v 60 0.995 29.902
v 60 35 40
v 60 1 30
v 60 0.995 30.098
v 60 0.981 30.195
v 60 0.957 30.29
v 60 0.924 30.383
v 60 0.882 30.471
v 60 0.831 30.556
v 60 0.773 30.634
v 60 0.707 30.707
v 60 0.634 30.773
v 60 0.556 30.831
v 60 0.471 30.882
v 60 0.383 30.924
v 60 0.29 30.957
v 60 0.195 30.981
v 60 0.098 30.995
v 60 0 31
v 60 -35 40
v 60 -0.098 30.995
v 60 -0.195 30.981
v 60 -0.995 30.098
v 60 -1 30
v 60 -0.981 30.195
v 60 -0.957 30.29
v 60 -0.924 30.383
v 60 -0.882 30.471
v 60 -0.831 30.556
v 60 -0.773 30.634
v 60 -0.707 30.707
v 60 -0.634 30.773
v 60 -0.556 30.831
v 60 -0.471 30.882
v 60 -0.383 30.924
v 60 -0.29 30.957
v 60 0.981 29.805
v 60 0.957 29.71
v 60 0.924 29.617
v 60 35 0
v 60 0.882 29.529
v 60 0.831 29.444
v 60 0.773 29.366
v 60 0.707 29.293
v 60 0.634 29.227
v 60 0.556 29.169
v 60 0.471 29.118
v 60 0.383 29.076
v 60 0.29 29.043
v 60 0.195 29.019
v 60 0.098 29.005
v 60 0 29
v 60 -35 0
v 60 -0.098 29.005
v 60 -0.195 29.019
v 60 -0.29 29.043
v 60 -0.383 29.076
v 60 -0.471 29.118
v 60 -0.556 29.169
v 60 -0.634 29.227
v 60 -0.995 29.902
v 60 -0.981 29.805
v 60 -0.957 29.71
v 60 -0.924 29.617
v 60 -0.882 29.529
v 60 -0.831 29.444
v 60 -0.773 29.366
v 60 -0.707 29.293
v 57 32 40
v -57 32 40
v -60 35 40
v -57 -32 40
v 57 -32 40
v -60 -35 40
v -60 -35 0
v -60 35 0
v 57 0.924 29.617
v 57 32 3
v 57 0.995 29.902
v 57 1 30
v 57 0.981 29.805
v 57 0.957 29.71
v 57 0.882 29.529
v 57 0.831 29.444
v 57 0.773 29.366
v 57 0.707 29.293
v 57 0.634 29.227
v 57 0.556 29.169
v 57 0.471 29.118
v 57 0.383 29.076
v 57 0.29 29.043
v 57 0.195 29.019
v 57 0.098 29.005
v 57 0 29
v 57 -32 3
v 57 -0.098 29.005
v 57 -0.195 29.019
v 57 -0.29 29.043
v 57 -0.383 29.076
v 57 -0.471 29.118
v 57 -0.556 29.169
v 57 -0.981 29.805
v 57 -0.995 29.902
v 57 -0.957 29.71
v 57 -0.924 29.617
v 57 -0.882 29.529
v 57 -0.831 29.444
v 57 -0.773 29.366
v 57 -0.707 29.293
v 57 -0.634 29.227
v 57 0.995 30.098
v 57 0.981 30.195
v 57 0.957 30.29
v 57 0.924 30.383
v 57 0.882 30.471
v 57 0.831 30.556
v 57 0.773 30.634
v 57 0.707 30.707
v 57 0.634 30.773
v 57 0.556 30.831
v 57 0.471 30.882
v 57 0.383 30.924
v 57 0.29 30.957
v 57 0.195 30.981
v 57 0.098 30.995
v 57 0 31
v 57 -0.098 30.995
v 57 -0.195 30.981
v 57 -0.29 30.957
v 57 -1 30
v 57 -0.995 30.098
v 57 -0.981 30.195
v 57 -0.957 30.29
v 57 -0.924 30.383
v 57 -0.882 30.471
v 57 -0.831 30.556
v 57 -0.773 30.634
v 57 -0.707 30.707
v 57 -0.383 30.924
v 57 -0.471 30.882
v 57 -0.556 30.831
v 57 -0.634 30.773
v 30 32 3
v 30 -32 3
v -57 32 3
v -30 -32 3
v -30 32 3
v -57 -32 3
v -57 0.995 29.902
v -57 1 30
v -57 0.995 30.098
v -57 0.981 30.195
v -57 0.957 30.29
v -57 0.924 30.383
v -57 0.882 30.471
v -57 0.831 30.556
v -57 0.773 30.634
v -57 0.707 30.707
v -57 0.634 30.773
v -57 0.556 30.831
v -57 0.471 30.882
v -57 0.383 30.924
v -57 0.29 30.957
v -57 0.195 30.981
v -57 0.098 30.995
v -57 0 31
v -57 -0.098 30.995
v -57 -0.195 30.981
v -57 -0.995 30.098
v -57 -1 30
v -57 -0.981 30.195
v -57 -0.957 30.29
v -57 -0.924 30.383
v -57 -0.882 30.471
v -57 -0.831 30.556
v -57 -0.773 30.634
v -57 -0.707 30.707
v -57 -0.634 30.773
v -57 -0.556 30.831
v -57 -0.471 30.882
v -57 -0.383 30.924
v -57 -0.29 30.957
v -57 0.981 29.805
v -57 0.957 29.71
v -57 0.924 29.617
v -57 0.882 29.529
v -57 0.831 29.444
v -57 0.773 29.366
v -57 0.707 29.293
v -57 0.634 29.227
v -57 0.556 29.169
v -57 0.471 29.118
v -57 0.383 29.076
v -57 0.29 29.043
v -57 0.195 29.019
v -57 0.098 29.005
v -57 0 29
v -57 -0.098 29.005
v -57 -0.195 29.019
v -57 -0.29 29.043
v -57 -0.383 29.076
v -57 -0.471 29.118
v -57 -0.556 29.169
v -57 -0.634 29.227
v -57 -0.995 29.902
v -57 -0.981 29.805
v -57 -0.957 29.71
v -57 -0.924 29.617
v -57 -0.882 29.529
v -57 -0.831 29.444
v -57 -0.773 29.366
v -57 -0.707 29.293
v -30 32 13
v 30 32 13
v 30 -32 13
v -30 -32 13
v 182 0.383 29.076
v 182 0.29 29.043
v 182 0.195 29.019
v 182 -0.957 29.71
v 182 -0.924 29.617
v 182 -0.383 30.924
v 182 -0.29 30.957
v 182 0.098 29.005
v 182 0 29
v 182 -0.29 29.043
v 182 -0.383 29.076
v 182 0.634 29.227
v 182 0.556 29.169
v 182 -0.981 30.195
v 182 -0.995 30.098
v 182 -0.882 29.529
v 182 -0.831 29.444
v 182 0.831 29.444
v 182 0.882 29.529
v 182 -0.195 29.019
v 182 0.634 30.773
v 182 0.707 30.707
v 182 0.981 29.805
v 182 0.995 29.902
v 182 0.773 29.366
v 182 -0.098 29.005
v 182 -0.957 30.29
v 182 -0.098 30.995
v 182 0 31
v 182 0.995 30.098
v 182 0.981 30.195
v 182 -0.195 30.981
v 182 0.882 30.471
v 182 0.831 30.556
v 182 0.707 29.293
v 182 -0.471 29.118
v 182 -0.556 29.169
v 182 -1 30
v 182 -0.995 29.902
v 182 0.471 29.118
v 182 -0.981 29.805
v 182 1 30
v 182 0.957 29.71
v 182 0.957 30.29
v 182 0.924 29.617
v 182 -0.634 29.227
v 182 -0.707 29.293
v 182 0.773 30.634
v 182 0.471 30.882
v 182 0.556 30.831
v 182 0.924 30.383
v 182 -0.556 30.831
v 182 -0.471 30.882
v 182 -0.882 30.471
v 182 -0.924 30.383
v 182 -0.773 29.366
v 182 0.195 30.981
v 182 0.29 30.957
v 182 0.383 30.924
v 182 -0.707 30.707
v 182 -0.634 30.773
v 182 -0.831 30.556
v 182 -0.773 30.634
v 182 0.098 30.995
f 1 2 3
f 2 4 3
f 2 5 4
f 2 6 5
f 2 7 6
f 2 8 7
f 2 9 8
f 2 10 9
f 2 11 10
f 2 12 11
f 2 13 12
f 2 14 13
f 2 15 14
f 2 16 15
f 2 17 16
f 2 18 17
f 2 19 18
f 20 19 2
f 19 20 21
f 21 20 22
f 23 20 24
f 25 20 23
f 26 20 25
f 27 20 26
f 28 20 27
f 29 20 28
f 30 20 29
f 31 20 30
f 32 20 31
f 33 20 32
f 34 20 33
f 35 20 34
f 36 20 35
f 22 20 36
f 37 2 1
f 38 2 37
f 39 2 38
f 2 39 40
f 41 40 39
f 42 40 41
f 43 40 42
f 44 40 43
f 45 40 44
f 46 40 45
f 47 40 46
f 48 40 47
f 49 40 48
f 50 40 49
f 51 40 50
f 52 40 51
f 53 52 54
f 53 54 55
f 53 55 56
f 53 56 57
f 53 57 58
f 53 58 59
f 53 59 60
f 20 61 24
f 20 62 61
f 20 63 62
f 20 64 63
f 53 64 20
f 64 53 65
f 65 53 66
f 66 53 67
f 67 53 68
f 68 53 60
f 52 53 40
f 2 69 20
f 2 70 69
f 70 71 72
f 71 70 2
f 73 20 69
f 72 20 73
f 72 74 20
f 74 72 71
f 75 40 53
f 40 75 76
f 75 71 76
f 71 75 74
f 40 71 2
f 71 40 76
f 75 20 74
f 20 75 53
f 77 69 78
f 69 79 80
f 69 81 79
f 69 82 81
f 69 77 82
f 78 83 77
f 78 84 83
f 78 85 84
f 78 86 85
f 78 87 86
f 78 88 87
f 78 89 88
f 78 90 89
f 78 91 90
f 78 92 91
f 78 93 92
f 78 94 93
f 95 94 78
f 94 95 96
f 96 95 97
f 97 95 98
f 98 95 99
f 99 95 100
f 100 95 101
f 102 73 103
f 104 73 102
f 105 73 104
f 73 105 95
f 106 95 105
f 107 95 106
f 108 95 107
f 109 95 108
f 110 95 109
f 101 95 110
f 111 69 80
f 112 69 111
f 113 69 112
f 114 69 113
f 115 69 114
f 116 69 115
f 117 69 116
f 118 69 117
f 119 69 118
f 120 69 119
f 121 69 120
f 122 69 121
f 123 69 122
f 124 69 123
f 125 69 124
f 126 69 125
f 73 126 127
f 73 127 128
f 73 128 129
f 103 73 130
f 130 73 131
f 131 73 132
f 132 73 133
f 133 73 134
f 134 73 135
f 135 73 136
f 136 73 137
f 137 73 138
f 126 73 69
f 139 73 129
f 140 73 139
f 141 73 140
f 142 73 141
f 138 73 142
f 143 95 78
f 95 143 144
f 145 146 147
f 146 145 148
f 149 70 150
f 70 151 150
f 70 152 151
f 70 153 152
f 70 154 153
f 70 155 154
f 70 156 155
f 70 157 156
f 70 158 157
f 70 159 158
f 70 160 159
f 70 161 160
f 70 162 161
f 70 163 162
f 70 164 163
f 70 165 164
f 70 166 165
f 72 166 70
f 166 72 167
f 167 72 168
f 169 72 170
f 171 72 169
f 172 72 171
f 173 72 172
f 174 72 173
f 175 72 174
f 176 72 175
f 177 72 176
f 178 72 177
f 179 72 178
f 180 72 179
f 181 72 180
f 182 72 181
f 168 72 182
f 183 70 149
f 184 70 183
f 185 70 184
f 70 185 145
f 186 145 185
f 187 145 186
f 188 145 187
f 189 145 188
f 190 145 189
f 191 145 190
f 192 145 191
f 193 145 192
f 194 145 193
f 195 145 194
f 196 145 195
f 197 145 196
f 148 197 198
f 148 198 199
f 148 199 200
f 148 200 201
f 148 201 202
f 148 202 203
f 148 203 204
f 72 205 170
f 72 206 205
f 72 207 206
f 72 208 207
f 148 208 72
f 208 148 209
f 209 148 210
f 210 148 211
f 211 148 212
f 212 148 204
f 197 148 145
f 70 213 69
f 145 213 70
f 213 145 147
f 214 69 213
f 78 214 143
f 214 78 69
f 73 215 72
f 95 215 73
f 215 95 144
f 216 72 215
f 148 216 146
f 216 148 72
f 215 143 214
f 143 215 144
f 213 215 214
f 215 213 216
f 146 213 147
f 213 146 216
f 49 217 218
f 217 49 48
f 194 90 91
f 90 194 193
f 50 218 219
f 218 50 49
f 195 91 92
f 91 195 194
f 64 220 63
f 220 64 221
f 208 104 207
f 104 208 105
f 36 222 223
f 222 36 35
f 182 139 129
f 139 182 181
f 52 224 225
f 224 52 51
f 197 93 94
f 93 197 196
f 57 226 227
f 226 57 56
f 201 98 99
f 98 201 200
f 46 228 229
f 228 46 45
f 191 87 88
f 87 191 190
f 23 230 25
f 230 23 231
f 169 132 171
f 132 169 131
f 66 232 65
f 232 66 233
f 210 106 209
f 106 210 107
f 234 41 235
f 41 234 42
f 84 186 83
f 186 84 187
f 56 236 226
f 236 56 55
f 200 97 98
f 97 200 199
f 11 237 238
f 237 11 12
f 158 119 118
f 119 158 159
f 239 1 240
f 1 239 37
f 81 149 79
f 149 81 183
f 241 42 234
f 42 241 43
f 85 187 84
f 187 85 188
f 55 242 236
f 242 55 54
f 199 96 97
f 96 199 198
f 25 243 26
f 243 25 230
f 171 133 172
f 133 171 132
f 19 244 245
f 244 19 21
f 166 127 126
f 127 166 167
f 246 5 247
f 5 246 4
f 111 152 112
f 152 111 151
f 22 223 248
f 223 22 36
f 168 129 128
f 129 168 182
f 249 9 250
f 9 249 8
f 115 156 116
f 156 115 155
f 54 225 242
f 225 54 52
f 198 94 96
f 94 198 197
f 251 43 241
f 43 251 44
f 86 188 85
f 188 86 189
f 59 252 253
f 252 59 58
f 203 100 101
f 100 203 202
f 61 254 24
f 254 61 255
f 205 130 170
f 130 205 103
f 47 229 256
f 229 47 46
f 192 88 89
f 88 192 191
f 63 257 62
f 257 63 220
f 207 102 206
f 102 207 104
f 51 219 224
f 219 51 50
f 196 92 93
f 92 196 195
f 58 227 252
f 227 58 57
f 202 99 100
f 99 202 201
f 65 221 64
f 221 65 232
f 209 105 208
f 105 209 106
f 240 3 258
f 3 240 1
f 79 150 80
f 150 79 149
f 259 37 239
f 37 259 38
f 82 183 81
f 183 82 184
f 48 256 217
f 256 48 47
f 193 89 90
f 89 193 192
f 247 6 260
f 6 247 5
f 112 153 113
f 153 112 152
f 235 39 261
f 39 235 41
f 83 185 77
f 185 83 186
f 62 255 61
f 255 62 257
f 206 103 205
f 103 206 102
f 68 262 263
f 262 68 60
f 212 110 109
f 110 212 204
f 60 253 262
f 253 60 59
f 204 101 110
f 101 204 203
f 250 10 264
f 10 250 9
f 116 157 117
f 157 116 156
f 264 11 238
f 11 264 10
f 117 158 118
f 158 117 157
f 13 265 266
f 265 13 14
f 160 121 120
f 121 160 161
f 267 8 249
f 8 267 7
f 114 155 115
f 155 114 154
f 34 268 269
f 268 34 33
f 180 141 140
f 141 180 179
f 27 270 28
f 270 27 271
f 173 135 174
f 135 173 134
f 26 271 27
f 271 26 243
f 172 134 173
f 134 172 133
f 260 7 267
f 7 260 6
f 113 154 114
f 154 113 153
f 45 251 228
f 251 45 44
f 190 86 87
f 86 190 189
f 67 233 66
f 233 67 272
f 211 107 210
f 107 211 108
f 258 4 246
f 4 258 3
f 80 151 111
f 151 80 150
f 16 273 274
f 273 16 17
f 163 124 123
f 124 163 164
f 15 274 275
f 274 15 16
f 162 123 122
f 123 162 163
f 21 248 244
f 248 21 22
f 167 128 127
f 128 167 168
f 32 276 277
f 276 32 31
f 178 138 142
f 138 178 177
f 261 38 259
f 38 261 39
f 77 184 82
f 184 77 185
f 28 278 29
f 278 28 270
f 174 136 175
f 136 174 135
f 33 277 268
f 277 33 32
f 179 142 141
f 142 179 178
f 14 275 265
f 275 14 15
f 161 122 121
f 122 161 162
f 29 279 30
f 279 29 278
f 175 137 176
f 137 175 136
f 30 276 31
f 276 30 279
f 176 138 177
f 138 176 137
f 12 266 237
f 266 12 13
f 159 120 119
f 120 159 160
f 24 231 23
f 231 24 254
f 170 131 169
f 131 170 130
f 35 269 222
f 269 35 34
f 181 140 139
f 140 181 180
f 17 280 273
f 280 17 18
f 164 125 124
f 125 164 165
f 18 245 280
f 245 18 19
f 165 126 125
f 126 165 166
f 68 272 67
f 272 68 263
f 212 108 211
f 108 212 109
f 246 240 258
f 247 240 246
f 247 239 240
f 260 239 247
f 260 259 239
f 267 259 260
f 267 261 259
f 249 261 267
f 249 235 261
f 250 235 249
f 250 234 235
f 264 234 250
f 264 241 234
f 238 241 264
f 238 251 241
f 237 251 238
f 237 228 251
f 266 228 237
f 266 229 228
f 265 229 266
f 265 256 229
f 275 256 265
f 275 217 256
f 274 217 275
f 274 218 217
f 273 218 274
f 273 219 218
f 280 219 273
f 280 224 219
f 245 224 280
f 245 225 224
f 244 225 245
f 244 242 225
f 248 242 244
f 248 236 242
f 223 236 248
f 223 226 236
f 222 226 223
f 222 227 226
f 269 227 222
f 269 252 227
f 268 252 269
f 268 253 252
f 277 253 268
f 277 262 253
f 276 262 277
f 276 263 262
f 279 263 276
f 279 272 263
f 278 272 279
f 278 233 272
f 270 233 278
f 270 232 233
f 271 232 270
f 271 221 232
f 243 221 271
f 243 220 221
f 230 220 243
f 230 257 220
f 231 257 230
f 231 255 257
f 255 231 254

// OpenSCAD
// Buffer tank for mini horizontal gel-electrophoresis box
// Dimensions measured with calipers

// Outer dimensions
outer_x = 120;
outer_y = 70;
outer_z = 40;

// Wall and floor thickness
wall_thickness = 3;
floor_thickness = 3;

// Inner dimensions (derived)
inner_x = outer_x - 2 * wall_thickness;
inner_y = outer_y - 2 * wall_thickness;
inner_z = outer_z - floor_thickness;

// Gel tray platform dimensions
platform_x = 60;
platform_y = inner_y; // spans full inner width
platform_z = 10; // height above inner floor
platform_z_top = floor_thickness + platform_z; // absolute Z position of top surface

// Electrode wire holes
hole_diameter = 2;
hole_y = 0;
hole_z = 30;

// Rendering quality
$fn = 64;

// Main tank body (outer shell minus inner cavity)
difference() {
    // Outer block
    translate([-outer_x/2, -outer_y/2, 0])
        cube([outer_x, outer_y, outer_z]);
    
    // Inner cavity (open top)
    // Cut from z = floor_thickness up to z = outer_z + 1 (extend past top)
    translate([-inner_x/2, -inner_y/2, floor_thickness])
        cube([inner_x, inner_y, outer_z - floor_thickness + 1]);
}

// Gel tray platform (solid raised platform in the middle)
// Positioned at center X, spanning full inner Y, from z = floor_thickness to z = platform_z_top
translate([-platform_x/2, -platform_y/2, floor_thickness])
    cube([platform_x, platform_y, platform_z]);

// Electrode wire holes through end walls
// Left end wall (X = -outer_x/2)
translate([-outer_x/2, hole_y, hole_z])
    rotate([0, 90, 0])
    cylinder(h = outer_x + 2, r = hole_diameter/2, $fn = 64);

// Right end wall (X = +outer_x/2)
translate([outer_x/2, hole_y, hole_z])
    rotate([0, 90, 0])
    cylinder(h = outer_x + 2, r = hole_diameter/2, $fn = 64);
